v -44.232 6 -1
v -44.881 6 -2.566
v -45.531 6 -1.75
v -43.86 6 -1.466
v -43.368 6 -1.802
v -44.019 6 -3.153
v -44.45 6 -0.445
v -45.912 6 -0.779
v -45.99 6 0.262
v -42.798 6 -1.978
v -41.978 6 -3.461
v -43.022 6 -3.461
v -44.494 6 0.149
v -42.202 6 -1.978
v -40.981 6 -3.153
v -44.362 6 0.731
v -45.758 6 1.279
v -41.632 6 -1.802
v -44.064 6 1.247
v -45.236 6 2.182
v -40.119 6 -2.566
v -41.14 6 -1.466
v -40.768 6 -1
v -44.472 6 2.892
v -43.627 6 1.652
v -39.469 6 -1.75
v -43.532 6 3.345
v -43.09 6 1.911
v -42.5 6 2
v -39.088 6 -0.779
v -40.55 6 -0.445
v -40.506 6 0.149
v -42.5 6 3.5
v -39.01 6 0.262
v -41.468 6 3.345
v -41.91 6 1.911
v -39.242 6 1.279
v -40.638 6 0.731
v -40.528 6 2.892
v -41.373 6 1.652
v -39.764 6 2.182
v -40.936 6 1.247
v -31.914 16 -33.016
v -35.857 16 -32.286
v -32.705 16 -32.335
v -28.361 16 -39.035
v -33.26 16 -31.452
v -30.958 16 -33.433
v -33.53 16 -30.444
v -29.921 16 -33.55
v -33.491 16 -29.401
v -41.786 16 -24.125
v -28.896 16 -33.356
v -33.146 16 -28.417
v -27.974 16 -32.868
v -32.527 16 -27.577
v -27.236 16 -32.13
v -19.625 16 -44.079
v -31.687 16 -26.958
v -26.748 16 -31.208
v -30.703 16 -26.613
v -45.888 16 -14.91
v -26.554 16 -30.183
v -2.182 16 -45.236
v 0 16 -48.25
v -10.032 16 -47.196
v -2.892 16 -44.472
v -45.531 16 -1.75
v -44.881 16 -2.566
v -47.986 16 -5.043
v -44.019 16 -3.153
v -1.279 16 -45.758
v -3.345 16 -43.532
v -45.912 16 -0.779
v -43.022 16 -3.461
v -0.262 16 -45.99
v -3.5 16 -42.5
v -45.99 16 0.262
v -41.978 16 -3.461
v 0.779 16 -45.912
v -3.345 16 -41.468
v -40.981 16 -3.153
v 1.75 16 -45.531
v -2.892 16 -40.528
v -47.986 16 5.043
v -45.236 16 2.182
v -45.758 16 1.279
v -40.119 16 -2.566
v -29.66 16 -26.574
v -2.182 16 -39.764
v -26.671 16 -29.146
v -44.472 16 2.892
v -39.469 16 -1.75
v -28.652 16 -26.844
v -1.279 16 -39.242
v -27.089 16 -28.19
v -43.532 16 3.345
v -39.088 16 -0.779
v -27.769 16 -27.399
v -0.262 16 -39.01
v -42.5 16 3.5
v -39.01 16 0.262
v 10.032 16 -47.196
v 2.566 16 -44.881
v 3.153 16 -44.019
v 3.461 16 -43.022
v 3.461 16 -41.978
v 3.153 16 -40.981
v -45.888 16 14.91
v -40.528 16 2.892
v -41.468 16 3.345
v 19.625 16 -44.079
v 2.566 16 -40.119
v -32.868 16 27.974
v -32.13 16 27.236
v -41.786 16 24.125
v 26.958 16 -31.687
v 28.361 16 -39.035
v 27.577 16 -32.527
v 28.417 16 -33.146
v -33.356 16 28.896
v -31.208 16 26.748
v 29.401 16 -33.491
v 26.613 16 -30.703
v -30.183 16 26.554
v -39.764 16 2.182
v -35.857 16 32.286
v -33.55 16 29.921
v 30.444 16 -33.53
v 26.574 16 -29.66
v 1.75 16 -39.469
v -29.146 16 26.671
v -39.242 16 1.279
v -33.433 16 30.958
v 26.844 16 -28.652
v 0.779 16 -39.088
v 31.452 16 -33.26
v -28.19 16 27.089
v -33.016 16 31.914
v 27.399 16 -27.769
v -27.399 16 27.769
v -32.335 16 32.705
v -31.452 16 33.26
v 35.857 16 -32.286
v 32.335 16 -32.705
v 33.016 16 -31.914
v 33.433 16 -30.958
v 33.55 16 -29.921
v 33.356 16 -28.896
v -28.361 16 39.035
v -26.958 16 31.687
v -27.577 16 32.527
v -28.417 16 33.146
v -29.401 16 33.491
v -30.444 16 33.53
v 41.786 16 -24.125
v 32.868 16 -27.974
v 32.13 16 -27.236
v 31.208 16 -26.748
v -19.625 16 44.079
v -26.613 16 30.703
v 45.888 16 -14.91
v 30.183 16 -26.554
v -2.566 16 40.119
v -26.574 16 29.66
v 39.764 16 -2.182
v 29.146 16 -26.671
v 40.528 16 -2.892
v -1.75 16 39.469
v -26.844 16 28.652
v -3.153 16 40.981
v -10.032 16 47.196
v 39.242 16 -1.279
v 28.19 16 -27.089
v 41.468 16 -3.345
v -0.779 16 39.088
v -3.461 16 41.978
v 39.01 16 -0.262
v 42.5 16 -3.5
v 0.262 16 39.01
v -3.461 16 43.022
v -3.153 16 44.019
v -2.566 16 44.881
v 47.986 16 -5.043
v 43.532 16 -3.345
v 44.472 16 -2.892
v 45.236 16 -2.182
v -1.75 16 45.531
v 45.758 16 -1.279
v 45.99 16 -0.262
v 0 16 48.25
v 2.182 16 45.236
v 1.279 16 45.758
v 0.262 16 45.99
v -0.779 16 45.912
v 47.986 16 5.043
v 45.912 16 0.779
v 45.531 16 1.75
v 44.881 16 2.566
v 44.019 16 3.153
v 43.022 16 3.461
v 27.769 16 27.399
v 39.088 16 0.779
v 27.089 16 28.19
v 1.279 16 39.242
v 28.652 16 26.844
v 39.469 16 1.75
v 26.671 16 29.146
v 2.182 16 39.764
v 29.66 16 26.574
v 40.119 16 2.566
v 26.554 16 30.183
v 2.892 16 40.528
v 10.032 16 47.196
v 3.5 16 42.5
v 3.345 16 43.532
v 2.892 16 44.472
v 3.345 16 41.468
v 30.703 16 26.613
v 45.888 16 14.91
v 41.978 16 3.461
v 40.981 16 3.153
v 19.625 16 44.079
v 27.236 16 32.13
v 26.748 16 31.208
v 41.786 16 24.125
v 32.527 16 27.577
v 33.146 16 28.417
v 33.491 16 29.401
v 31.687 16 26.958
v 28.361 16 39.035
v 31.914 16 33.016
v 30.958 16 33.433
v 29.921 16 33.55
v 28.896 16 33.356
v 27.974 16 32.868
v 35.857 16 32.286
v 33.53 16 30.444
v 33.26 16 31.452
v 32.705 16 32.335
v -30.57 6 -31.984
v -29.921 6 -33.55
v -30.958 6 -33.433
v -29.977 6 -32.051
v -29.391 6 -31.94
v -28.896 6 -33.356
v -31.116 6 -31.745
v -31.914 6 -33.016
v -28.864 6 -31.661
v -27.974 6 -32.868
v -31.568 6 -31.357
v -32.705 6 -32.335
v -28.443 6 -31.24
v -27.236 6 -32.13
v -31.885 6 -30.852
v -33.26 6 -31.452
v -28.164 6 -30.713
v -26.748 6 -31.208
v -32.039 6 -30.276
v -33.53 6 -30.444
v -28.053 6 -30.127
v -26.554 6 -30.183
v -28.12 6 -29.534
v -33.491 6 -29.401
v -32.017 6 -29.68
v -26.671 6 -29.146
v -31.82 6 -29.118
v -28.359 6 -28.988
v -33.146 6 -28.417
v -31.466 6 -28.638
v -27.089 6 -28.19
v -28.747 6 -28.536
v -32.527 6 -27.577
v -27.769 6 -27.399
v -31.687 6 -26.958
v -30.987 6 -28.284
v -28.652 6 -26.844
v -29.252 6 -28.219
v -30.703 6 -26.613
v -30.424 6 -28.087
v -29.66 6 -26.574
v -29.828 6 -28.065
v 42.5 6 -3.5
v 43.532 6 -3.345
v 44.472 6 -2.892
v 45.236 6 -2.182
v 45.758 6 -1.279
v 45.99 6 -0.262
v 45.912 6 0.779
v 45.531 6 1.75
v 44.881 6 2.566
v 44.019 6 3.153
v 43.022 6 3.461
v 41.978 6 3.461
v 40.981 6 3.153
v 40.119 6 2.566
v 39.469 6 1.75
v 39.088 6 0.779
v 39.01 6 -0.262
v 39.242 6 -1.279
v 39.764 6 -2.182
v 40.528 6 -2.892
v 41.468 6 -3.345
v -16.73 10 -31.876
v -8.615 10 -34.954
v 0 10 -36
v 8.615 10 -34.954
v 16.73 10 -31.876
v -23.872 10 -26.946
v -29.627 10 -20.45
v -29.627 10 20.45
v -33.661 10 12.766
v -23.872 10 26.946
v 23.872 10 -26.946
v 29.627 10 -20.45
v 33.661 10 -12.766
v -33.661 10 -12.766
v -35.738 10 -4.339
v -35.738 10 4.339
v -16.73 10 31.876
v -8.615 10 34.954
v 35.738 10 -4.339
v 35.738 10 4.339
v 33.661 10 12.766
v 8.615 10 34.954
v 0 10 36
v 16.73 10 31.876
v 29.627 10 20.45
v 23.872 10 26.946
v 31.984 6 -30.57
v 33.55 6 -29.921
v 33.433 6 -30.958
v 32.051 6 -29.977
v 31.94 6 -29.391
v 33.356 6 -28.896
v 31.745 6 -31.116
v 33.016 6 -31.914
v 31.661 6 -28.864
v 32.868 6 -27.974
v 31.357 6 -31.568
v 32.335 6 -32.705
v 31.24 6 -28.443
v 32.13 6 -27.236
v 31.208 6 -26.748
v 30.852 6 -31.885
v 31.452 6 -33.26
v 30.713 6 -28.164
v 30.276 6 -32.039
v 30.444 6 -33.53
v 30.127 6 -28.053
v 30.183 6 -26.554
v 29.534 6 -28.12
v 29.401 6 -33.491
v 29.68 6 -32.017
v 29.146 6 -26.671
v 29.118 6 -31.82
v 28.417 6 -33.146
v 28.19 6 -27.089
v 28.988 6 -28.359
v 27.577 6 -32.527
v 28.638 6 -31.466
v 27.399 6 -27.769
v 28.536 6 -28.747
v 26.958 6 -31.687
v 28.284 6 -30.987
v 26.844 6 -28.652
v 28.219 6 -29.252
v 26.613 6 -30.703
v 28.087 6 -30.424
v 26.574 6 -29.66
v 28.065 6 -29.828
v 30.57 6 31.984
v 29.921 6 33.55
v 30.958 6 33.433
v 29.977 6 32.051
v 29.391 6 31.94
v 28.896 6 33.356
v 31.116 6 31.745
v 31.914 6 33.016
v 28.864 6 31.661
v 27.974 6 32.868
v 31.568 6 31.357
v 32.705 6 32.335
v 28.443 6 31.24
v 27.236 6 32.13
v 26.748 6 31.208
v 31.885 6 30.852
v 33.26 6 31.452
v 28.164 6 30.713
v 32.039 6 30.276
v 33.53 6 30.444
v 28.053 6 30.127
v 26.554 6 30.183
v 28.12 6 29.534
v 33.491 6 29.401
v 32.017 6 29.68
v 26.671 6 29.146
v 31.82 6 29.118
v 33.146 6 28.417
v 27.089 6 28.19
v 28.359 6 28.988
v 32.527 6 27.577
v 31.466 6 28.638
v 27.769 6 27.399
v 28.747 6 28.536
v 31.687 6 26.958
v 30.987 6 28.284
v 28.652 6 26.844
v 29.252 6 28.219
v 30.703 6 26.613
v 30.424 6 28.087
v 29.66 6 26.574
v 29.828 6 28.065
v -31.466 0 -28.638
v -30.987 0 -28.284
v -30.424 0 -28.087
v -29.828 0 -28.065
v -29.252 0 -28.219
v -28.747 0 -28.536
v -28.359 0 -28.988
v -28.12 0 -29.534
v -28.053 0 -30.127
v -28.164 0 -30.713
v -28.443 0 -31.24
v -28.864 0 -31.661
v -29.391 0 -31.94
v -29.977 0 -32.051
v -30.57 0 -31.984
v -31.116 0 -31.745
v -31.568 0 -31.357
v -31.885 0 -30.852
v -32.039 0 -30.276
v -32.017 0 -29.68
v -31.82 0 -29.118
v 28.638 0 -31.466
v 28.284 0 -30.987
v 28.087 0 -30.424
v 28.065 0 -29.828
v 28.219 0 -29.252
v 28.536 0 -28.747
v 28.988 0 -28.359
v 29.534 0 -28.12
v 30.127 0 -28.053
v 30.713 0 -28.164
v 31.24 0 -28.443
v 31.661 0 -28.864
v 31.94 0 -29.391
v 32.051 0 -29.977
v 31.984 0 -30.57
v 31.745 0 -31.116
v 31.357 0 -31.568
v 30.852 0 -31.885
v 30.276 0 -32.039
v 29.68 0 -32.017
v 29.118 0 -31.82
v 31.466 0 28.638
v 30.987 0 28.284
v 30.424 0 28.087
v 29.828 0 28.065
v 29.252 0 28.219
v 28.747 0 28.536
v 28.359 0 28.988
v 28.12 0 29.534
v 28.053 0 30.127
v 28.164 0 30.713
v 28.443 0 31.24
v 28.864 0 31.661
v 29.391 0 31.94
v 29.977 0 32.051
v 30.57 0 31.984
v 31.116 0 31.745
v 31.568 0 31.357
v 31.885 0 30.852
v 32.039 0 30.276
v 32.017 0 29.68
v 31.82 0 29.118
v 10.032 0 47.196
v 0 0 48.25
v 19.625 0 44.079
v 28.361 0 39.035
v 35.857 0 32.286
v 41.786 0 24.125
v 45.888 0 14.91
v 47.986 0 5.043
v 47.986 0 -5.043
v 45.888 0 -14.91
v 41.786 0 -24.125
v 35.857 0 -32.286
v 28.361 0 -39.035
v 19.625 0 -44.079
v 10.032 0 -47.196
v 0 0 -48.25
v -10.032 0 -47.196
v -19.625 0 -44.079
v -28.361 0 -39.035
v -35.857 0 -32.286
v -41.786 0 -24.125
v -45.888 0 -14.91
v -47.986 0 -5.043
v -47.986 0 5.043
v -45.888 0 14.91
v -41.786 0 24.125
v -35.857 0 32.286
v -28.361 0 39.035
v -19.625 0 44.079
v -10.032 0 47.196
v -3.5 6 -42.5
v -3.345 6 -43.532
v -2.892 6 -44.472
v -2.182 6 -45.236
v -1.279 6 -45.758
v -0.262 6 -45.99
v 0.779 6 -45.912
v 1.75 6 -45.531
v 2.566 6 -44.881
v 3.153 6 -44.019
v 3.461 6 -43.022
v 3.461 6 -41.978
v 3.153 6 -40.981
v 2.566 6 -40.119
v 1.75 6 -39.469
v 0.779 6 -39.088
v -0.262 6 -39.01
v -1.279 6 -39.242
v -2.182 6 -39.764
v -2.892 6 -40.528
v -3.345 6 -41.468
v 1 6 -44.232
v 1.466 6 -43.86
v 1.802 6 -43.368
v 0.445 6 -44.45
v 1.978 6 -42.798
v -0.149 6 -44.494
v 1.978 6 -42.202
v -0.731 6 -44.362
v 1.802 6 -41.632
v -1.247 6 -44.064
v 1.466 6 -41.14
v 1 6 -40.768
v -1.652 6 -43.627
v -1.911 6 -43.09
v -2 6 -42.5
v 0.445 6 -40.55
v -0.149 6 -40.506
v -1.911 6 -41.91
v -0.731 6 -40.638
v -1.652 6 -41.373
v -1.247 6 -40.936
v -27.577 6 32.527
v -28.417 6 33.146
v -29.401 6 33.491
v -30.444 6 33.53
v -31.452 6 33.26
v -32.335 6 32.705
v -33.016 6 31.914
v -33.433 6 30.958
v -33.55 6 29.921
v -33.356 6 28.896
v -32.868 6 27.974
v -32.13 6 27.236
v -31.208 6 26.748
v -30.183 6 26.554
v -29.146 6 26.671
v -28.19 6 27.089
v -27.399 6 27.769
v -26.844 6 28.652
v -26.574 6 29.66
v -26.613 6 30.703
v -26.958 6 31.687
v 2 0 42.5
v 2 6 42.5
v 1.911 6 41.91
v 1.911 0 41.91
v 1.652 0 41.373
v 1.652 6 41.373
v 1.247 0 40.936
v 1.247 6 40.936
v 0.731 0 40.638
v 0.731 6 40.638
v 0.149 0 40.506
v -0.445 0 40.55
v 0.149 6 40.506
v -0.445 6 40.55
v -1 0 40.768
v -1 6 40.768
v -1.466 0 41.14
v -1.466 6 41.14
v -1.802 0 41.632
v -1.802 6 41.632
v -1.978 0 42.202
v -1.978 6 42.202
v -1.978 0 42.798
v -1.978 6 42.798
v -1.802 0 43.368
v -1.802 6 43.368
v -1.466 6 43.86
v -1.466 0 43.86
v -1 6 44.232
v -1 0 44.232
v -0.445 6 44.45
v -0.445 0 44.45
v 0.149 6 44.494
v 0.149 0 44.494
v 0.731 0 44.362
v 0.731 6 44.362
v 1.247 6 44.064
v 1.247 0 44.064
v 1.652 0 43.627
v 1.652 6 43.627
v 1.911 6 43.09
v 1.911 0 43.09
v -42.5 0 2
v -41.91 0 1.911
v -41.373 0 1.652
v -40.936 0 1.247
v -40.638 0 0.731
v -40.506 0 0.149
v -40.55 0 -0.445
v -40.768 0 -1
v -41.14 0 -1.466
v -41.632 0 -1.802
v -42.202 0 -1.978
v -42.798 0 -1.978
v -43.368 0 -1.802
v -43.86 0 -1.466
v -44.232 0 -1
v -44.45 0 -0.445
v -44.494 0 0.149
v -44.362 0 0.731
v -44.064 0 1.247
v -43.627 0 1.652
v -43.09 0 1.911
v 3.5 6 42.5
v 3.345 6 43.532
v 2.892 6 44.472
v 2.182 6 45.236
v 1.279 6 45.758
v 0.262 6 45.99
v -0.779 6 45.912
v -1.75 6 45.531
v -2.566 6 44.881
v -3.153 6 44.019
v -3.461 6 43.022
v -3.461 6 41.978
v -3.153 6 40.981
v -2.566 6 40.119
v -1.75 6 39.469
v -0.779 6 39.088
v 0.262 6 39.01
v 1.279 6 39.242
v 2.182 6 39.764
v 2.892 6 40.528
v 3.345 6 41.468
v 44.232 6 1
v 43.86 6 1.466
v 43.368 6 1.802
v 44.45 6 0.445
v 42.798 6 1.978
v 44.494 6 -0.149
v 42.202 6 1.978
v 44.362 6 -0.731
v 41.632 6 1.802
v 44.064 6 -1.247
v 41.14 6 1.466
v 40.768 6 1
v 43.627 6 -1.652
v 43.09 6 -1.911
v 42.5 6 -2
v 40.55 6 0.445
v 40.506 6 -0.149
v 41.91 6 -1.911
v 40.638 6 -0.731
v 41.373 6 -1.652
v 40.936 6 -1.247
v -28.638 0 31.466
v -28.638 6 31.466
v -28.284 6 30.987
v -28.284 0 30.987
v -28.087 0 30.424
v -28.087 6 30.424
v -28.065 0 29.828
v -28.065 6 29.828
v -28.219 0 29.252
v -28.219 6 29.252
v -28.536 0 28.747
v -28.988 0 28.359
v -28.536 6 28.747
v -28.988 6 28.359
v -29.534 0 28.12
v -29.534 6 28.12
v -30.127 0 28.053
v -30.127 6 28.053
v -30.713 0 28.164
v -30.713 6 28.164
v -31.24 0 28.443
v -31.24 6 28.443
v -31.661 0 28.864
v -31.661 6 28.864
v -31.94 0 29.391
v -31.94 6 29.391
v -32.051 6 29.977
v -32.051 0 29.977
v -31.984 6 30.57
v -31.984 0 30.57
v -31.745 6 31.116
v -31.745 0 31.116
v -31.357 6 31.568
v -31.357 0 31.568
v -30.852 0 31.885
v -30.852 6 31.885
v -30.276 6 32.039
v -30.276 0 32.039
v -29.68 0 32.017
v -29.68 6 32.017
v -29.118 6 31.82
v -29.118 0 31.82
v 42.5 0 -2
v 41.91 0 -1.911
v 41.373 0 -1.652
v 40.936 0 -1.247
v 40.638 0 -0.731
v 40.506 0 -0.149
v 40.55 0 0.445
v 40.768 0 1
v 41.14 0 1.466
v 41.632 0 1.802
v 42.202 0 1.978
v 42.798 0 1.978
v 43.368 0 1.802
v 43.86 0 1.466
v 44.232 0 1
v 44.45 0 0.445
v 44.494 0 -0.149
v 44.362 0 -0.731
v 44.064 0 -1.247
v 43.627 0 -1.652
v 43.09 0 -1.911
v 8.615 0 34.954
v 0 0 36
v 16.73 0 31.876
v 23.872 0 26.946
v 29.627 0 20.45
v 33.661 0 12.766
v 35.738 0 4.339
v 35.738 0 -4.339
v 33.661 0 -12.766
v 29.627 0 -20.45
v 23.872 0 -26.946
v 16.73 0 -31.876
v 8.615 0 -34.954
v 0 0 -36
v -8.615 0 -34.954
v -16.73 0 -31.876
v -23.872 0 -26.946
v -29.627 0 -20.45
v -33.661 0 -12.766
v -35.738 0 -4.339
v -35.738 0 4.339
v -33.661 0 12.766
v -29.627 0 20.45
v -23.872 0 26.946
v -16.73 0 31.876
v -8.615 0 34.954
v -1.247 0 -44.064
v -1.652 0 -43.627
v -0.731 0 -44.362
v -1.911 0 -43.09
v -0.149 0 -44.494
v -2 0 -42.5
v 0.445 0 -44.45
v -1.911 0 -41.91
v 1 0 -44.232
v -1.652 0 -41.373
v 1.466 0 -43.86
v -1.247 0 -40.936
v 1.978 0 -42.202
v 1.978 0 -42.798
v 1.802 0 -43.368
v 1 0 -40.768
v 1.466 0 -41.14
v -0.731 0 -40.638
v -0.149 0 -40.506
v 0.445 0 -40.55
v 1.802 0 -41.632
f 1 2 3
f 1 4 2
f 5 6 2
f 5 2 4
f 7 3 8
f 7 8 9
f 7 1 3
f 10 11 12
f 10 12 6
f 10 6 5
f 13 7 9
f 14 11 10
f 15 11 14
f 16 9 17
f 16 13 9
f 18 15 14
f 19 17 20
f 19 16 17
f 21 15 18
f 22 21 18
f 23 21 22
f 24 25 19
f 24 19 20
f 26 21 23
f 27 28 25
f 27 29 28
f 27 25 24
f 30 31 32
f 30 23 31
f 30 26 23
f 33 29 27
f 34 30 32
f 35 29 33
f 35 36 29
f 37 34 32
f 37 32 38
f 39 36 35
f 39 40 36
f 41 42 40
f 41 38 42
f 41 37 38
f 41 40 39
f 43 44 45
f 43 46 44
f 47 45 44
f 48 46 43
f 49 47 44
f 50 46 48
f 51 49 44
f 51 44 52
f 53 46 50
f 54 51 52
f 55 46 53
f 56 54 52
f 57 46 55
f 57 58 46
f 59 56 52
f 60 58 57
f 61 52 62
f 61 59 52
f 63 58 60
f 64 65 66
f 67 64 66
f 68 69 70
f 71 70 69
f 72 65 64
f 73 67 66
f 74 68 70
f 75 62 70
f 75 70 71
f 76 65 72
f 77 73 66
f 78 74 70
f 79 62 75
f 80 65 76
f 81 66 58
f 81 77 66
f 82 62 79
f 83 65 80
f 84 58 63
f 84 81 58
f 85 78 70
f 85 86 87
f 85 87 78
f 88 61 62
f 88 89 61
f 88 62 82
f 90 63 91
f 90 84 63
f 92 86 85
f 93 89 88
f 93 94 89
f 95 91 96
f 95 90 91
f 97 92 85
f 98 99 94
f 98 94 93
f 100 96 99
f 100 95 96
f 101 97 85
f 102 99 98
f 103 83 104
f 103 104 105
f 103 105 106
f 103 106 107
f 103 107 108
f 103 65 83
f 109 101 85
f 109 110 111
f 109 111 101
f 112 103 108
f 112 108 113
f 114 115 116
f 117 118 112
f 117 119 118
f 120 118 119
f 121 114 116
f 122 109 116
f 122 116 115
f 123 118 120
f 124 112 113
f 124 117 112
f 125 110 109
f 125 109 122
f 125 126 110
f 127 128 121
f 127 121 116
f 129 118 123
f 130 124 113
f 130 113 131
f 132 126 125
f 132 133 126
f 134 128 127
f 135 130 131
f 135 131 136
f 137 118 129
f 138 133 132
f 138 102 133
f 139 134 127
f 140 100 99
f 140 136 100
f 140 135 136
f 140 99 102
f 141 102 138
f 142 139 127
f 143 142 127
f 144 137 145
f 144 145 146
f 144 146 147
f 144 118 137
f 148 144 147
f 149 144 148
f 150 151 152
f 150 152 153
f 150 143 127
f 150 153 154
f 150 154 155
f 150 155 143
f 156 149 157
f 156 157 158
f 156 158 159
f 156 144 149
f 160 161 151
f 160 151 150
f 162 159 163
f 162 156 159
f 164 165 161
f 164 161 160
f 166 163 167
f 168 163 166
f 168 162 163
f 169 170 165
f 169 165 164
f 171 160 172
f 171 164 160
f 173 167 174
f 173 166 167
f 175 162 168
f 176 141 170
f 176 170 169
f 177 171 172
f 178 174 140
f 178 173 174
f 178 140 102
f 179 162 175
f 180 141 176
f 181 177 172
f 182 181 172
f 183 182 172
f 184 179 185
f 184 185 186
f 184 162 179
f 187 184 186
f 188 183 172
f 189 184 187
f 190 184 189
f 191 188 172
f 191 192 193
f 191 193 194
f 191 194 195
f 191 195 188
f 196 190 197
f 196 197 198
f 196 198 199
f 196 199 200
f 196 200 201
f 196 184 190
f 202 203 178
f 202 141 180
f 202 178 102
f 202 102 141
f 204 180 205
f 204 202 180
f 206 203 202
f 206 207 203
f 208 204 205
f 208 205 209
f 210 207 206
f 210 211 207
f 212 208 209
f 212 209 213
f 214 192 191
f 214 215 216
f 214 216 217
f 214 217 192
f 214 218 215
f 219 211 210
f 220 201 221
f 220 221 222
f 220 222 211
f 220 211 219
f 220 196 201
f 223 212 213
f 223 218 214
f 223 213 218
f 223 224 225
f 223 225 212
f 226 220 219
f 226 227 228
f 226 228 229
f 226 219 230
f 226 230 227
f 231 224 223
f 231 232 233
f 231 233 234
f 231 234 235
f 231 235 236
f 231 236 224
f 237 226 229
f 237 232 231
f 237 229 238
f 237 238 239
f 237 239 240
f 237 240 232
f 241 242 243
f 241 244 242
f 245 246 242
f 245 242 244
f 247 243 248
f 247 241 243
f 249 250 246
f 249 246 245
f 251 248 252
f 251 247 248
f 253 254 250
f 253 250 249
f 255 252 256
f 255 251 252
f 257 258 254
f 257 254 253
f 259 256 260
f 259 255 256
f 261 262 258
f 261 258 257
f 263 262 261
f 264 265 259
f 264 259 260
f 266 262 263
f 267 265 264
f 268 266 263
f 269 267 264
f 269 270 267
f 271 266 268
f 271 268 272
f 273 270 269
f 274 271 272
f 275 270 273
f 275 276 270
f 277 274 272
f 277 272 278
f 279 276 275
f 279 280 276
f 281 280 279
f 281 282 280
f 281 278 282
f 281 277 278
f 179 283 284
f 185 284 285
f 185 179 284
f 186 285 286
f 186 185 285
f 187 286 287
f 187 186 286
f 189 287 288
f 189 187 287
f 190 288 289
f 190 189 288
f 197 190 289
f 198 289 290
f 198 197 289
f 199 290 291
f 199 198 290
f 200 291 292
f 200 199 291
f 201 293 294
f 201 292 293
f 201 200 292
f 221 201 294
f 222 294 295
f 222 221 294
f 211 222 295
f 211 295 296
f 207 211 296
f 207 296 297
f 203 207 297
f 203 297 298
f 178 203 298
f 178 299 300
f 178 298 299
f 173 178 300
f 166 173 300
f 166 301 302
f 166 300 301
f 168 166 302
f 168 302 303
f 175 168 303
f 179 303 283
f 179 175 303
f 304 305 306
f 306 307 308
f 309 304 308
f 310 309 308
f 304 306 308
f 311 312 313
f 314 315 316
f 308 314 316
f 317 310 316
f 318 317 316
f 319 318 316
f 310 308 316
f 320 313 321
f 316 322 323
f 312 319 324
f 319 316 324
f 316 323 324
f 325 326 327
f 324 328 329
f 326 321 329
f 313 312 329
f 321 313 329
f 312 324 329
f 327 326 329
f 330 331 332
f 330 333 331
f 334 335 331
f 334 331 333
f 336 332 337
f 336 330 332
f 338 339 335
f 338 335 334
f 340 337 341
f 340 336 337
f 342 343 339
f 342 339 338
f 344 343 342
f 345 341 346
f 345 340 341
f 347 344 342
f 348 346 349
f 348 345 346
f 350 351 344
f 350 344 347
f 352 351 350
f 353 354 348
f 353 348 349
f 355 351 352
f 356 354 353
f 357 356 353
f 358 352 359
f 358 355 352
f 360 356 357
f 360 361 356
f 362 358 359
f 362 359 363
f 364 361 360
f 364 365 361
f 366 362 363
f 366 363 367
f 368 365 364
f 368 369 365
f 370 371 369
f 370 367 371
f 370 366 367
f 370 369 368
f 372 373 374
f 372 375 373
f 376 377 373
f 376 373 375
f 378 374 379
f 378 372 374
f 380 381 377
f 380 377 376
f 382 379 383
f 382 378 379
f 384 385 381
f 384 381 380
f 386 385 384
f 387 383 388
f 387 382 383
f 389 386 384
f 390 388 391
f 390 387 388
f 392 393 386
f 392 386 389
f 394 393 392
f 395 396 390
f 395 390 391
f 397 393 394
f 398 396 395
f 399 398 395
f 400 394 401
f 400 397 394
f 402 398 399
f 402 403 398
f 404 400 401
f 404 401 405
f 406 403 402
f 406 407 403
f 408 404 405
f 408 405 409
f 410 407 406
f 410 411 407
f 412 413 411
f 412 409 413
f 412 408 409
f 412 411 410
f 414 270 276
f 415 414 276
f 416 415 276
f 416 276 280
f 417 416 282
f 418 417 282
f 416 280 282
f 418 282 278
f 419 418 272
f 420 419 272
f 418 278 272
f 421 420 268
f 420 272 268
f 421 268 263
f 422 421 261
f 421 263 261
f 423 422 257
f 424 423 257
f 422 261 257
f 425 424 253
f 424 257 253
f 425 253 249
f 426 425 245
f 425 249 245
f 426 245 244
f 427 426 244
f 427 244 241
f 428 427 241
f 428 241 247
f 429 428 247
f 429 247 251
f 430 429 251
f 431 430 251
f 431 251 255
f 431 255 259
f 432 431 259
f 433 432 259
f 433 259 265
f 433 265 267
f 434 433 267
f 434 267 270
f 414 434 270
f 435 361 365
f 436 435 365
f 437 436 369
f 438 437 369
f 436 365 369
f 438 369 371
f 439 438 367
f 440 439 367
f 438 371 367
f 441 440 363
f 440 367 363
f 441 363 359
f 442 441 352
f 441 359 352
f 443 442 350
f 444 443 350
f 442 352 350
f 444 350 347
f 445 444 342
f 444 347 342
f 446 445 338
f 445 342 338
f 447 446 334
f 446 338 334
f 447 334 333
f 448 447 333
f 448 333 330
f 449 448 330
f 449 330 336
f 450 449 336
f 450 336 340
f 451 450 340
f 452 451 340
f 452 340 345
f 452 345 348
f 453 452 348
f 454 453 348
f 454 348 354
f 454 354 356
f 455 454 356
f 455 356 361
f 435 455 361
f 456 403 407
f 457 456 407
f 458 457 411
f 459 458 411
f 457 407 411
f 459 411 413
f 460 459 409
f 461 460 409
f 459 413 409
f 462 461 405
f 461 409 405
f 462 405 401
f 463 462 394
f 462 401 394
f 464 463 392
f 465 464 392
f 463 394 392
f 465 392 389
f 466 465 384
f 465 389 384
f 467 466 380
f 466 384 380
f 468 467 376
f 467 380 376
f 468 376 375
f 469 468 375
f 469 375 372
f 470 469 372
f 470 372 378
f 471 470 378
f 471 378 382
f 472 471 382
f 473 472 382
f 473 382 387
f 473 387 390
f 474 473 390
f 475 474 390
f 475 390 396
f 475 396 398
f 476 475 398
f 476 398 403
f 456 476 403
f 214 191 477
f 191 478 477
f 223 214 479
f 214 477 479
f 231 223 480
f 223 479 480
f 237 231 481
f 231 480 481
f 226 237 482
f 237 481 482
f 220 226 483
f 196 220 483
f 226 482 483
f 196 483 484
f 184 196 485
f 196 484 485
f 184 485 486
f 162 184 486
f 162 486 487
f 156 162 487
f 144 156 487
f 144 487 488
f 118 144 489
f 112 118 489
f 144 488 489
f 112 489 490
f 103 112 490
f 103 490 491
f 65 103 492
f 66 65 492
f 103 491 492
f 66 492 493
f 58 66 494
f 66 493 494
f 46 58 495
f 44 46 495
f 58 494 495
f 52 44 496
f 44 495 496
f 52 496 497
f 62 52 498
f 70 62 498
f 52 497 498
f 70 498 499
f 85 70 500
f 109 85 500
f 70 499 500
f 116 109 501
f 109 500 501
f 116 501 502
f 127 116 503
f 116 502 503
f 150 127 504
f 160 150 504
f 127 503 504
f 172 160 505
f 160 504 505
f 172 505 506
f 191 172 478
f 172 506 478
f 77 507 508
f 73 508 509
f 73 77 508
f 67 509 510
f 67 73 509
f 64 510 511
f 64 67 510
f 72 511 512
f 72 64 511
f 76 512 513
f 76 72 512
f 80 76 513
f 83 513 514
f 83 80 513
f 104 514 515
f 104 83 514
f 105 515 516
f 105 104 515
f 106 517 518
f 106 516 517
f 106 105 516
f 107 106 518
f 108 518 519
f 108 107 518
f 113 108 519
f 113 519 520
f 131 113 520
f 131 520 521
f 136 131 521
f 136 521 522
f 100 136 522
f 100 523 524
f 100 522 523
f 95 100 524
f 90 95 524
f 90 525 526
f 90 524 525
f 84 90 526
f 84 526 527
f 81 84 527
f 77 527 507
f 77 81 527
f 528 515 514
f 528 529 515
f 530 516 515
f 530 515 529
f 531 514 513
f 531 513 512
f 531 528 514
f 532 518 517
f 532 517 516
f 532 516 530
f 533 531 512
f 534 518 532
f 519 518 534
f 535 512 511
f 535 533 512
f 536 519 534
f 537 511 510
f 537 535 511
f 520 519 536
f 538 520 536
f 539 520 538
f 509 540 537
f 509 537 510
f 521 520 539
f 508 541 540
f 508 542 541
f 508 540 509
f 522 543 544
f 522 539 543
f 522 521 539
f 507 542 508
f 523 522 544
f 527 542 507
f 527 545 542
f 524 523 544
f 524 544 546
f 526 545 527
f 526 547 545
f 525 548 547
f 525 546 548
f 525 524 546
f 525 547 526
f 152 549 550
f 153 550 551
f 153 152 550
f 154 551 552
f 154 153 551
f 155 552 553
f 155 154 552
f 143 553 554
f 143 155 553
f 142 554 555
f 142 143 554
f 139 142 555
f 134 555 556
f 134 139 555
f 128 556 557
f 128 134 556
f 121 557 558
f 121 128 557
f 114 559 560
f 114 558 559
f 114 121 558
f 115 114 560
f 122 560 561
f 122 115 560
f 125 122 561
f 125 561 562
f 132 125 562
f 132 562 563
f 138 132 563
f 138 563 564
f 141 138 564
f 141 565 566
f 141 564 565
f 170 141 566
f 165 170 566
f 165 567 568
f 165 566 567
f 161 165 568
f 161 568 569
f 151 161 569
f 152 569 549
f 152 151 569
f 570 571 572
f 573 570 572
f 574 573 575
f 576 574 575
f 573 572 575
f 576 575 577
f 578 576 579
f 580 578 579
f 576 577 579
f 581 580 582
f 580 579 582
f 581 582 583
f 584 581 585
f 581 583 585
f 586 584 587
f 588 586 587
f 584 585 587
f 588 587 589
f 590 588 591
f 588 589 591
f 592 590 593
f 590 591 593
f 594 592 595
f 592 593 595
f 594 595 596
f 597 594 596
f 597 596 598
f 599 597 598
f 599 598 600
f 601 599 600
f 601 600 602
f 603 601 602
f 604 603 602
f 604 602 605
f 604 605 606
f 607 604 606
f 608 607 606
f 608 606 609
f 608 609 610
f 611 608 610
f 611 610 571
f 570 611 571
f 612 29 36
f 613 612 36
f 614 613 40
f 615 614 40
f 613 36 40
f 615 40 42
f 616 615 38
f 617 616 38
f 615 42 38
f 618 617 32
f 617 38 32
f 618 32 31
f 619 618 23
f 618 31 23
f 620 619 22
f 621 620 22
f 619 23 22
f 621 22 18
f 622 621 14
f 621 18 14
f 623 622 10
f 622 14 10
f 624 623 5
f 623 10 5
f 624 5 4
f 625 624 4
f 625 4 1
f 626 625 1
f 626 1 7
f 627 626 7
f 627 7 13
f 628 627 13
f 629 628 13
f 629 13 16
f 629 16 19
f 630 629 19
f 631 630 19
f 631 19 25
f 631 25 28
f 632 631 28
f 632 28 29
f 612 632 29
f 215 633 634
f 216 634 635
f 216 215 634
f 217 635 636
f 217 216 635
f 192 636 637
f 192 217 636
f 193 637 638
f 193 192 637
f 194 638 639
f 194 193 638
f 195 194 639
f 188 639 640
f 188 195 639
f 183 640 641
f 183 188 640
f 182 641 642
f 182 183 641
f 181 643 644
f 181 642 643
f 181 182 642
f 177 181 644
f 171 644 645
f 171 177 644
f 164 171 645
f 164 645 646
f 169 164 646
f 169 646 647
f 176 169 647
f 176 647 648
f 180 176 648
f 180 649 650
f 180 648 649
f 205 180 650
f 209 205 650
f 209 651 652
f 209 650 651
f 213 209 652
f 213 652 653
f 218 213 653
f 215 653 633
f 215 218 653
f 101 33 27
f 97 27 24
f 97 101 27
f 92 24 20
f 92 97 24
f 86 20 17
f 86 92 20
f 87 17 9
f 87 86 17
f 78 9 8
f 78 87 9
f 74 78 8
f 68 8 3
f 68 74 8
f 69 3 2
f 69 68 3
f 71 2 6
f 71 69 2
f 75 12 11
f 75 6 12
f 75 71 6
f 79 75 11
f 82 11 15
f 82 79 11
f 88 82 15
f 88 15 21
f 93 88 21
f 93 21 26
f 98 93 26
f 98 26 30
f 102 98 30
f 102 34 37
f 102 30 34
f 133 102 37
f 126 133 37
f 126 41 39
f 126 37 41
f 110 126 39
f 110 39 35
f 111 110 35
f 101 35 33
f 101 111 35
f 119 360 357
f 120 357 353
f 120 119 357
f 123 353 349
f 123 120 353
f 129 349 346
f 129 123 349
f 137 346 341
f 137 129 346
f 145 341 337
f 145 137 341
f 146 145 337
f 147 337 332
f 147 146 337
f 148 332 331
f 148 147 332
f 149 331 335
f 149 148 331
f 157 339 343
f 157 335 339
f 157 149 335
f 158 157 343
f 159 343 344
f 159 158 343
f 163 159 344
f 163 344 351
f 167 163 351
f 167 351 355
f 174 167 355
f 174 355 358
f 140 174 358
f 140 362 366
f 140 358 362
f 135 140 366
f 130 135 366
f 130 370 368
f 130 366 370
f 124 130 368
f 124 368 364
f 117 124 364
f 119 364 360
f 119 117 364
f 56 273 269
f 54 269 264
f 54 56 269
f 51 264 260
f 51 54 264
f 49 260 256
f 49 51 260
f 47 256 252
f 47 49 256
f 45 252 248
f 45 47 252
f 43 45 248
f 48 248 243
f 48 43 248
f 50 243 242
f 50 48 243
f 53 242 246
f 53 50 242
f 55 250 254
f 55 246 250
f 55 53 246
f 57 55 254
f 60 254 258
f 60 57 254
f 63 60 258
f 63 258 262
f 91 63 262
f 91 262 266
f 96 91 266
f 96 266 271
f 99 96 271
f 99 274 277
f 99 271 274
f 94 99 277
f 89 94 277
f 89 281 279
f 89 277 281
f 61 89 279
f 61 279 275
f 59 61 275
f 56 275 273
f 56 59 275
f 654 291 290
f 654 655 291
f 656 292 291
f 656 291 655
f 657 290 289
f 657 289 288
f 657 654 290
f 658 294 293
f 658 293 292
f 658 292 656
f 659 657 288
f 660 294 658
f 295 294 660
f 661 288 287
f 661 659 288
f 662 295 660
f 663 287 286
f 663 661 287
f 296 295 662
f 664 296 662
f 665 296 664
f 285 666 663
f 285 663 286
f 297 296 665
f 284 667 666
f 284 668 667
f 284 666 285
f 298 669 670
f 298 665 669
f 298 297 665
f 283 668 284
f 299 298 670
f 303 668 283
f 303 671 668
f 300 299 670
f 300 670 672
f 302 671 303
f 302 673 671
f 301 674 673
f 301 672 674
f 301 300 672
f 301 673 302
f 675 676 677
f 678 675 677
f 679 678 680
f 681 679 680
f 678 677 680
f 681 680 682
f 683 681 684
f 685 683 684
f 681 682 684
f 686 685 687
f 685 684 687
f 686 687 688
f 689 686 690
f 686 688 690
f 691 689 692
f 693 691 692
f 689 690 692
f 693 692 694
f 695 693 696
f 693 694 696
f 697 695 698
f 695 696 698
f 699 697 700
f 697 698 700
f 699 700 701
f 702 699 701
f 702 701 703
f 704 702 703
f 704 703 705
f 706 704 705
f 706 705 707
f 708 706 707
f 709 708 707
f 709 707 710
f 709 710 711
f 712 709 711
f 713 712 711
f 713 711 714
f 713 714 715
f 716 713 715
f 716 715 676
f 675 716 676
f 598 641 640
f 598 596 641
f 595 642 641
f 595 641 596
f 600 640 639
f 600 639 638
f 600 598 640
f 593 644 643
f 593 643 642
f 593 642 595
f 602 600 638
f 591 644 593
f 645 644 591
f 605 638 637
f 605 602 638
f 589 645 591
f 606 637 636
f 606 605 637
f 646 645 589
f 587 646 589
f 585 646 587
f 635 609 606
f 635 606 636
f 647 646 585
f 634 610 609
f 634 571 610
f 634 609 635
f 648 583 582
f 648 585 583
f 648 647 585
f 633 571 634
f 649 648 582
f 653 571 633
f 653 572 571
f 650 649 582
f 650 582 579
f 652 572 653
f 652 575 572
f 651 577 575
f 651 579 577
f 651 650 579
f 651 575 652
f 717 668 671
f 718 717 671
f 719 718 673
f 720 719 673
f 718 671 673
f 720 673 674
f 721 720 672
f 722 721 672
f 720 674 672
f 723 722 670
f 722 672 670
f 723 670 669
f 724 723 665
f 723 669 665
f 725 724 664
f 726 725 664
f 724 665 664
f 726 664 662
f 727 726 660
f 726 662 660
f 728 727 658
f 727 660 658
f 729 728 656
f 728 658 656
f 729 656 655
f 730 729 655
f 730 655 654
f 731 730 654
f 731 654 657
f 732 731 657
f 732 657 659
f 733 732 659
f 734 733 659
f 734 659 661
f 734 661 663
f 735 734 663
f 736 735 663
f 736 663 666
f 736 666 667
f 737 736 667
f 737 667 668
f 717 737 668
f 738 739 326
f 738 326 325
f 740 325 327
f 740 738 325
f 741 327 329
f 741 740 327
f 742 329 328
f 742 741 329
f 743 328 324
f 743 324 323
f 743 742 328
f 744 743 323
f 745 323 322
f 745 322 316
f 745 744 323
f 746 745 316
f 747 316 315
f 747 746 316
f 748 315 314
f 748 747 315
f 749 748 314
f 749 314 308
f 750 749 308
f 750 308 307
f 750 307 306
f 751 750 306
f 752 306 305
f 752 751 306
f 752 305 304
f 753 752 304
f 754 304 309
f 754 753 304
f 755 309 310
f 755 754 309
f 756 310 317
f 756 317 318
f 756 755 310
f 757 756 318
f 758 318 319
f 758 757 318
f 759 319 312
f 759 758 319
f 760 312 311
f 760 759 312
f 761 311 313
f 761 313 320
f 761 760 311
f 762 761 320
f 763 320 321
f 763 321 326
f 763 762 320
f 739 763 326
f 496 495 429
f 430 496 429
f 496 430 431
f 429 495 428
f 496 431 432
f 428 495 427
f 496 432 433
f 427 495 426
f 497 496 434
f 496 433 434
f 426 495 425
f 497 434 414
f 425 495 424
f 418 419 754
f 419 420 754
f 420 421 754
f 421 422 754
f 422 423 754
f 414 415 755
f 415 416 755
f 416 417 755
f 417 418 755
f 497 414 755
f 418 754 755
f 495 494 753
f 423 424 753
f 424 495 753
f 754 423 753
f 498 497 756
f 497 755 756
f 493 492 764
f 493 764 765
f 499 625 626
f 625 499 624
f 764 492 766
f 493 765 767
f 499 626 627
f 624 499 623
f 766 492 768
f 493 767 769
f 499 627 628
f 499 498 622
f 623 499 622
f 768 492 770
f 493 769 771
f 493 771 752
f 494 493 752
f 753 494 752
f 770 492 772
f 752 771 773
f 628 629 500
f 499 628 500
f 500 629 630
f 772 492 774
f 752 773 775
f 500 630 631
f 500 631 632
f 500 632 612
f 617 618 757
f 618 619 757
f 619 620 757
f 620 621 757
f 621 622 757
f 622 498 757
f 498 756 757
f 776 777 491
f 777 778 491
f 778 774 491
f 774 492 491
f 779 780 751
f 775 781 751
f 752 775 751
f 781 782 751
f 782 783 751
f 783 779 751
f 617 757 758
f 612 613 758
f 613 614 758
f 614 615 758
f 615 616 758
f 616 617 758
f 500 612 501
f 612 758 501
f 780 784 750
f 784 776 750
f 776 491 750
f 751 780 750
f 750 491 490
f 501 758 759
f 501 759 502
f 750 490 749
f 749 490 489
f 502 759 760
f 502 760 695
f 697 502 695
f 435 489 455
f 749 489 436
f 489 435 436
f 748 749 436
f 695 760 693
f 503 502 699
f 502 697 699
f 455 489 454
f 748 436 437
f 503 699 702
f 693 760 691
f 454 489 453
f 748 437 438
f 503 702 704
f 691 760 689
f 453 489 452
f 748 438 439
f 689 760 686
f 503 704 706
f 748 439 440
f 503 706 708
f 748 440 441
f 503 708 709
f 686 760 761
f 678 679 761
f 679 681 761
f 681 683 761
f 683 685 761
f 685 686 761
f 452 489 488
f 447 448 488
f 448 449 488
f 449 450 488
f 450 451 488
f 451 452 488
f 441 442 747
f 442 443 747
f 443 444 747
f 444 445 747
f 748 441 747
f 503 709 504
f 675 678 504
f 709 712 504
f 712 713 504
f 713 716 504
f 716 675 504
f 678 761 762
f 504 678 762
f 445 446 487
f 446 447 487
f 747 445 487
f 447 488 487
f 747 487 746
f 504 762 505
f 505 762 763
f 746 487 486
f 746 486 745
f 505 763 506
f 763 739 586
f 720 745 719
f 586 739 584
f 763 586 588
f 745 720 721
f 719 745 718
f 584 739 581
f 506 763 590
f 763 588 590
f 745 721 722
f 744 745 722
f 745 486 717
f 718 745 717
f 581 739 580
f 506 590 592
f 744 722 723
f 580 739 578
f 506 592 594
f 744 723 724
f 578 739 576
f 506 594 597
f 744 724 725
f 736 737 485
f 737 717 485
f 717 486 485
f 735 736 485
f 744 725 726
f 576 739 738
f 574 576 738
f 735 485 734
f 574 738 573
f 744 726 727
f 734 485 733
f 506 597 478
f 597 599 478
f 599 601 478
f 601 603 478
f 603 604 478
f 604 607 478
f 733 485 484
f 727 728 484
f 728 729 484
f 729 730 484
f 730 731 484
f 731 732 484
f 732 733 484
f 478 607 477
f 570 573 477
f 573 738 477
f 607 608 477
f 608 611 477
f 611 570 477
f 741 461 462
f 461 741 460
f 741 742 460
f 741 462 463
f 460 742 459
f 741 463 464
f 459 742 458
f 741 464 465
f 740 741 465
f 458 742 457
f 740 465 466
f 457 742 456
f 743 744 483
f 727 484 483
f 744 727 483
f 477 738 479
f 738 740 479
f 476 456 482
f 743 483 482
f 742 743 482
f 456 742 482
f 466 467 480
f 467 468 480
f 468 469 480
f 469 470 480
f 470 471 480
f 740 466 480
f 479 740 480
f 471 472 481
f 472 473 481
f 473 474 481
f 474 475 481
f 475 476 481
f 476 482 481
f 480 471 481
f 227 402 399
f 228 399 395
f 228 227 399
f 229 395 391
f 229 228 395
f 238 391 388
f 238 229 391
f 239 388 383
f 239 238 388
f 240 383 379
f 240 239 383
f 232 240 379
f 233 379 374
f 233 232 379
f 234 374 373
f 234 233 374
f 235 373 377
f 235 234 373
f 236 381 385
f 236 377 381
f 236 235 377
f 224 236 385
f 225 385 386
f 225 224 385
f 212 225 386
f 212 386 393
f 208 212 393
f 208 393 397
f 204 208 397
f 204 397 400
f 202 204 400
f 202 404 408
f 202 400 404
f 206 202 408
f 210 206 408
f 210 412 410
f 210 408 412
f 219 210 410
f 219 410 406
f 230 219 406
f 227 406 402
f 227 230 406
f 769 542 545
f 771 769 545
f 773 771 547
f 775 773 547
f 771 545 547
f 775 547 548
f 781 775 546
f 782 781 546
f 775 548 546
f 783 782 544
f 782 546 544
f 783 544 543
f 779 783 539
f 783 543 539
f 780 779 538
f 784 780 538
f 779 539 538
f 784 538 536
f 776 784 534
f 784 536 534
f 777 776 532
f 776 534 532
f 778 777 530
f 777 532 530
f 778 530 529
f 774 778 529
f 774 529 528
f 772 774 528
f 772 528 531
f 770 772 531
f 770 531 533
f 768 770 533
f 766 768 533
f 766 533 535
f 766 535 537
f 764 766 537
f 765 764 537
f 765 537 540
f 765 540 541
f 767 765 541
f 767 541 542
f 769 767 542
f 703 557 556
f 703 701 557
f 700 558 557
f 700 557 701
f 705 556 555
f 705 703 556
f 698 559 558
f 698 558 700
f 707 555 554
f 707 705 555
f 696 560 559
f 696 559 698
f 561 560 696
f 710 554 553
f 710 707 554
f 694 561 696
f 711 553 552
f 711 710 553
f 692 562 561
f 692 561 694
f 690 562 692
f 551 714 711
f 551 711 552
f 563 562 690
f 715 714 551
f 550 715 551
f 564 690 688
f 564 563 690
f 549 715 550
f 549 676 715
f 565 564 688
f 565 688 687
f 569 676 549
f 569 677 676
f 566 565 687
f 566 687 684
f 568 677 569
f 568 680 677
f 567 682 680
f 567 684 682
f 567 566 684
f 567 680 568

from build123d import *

# Parameters (mm, degrees)
SKETCH1_R           = 48.25
SKETCH1_R_2         = 36
BOSS_EXTRUDE6_DEPTH = 10
SKETCH21_R          = 2
CUT_EXTRUDE1_DEPTH  = 18
CIRPATTERN1_COUNT   = 8
SKETCH22_R          = 3.5
CUT_EXTRUDE2_DEPTH  = 4
CIRPATTERN2_COUNT   = 8
SKETCH23_R          = 48.25
BOSS_EXTRUDE7_DEPTH = 6
CUT_EXTRUDE3_START  = -6
SKETCH25_R          = 3.5
CUT_EXTRUDE3_DEPTH  = 6
CIRPATTERN4_COUNT   = 8


with BuildPart() as part:
    # Sketch1 → Boss-Extrude6 (new body)
    with BuildSketch(Plane(origin=(0, 0, 0), x_dir=(1, 0, 0), z_dir=(0, 1, 0))):
        with Locations(Location((0, 0, 0), (0, 0, 270))):
            Circle(SKETCH1_R)
        with Locations(Location((0, 0, 0), (0, 0, 270))):
            Circle(SKETCH1_R_2, mode=Mode.SUBTRACT)
    extrude(amount=BOSS_EXTRUDE6_DEPTH)

    # Sketch21 → Cut-Extrude1 (cut)
    with BuildSketch(Plane(origin=(0, 10, 0), x_dir=(1, 0, 0), z_dir=(0, 1, 0))):
        with Locations(Location((-42.5, 0, 0), (0, 0, 270))):
            Circle(SKETCH21_R)
    cut_extrude1 = extrude(amount=-CUT_EXTRUDE1_DEPTH, mode=Mode.SUBTRACT)

    # CirPattern1: Cut-Extrude1 ×8 about axis
    cirpattern1_axis = Axis((0, 0, 0), (0, 1, 0))
    for i in range(1, CIRPATTERN1_COUNT):
        add(cut_extrude1.rotate(cirpattern1_axis, i * 360 / CIRPATTERN1_COUNT), mode=Mode.SUBTRACT)

    # Sketch22 → Cut-Extrude2 (cut)
    with BuildSketch(Plane(origin=(0, 10, 0), x_dir=(1, 0, 0), z_dir=(0, 1, 0))):
        with Locations(Location((-42.5, 0, 0), (0, 0, 270))):
            Circle(SKETCH22_R)
    cut_extrude2 = extrude(amount=-CUT_EXTRUDE2_DEPTH, mode=Mode.SUBTRACT)

    # CirPattern2: Cut-Extrude2 ×8 about axis
    cirpattern2_axis = Axis((0, 0, 0), (0, 1, 0))
    for i in range(1, CIRPATTERN2_COUNT):
        add(cut_extrude2.rotate(cirpattern2_axis, i * 360 / CIRPATTERN2_COUNT), mode=Mode.SUBTRACT)

    # Sketch23 → Boss-Extrude7 (add)
    with BuildSketch(Plane(origin=(0, 10, 0), x_dir=(1, 0, 0), z_dir=(0, 1, 0))):
        with Locations(Location((0, 0, 0), (0, 0, 270))):
            Circle(SKETCH23_R)
    extrude(amount=BOSS_EXTRUDE7_DEPTH)

    # Sketch25 → Cut-Extrude3 (cut)
    with BuildSketch(Plane.XZ.offset(-10).offset(CUT_EXTRUDE3_START)):
        with Locations(Location((-42.5, 0, 0), (0, 0, 90))):
            Circle(SKETCH25_R)
    cut_extrude3 = extrude(amount=CUT_EXTRUDE3_DEPTH, mode=Mode.SUBTRACT)

    # CirPattern4: Cut-Extrude3 ×8 about axis
    cirpattern4_axis = Axis((0, 10, 0), (0, -1, 0))
    for i in range(1, CIRPATTERN4_COUNT):
        add(cut_extrude3.rotate(cirpattern4_axis, i * 360 / CIRPATTERN4_COUNT), mode=Mode.SUBTRACT)


solid = part.part
